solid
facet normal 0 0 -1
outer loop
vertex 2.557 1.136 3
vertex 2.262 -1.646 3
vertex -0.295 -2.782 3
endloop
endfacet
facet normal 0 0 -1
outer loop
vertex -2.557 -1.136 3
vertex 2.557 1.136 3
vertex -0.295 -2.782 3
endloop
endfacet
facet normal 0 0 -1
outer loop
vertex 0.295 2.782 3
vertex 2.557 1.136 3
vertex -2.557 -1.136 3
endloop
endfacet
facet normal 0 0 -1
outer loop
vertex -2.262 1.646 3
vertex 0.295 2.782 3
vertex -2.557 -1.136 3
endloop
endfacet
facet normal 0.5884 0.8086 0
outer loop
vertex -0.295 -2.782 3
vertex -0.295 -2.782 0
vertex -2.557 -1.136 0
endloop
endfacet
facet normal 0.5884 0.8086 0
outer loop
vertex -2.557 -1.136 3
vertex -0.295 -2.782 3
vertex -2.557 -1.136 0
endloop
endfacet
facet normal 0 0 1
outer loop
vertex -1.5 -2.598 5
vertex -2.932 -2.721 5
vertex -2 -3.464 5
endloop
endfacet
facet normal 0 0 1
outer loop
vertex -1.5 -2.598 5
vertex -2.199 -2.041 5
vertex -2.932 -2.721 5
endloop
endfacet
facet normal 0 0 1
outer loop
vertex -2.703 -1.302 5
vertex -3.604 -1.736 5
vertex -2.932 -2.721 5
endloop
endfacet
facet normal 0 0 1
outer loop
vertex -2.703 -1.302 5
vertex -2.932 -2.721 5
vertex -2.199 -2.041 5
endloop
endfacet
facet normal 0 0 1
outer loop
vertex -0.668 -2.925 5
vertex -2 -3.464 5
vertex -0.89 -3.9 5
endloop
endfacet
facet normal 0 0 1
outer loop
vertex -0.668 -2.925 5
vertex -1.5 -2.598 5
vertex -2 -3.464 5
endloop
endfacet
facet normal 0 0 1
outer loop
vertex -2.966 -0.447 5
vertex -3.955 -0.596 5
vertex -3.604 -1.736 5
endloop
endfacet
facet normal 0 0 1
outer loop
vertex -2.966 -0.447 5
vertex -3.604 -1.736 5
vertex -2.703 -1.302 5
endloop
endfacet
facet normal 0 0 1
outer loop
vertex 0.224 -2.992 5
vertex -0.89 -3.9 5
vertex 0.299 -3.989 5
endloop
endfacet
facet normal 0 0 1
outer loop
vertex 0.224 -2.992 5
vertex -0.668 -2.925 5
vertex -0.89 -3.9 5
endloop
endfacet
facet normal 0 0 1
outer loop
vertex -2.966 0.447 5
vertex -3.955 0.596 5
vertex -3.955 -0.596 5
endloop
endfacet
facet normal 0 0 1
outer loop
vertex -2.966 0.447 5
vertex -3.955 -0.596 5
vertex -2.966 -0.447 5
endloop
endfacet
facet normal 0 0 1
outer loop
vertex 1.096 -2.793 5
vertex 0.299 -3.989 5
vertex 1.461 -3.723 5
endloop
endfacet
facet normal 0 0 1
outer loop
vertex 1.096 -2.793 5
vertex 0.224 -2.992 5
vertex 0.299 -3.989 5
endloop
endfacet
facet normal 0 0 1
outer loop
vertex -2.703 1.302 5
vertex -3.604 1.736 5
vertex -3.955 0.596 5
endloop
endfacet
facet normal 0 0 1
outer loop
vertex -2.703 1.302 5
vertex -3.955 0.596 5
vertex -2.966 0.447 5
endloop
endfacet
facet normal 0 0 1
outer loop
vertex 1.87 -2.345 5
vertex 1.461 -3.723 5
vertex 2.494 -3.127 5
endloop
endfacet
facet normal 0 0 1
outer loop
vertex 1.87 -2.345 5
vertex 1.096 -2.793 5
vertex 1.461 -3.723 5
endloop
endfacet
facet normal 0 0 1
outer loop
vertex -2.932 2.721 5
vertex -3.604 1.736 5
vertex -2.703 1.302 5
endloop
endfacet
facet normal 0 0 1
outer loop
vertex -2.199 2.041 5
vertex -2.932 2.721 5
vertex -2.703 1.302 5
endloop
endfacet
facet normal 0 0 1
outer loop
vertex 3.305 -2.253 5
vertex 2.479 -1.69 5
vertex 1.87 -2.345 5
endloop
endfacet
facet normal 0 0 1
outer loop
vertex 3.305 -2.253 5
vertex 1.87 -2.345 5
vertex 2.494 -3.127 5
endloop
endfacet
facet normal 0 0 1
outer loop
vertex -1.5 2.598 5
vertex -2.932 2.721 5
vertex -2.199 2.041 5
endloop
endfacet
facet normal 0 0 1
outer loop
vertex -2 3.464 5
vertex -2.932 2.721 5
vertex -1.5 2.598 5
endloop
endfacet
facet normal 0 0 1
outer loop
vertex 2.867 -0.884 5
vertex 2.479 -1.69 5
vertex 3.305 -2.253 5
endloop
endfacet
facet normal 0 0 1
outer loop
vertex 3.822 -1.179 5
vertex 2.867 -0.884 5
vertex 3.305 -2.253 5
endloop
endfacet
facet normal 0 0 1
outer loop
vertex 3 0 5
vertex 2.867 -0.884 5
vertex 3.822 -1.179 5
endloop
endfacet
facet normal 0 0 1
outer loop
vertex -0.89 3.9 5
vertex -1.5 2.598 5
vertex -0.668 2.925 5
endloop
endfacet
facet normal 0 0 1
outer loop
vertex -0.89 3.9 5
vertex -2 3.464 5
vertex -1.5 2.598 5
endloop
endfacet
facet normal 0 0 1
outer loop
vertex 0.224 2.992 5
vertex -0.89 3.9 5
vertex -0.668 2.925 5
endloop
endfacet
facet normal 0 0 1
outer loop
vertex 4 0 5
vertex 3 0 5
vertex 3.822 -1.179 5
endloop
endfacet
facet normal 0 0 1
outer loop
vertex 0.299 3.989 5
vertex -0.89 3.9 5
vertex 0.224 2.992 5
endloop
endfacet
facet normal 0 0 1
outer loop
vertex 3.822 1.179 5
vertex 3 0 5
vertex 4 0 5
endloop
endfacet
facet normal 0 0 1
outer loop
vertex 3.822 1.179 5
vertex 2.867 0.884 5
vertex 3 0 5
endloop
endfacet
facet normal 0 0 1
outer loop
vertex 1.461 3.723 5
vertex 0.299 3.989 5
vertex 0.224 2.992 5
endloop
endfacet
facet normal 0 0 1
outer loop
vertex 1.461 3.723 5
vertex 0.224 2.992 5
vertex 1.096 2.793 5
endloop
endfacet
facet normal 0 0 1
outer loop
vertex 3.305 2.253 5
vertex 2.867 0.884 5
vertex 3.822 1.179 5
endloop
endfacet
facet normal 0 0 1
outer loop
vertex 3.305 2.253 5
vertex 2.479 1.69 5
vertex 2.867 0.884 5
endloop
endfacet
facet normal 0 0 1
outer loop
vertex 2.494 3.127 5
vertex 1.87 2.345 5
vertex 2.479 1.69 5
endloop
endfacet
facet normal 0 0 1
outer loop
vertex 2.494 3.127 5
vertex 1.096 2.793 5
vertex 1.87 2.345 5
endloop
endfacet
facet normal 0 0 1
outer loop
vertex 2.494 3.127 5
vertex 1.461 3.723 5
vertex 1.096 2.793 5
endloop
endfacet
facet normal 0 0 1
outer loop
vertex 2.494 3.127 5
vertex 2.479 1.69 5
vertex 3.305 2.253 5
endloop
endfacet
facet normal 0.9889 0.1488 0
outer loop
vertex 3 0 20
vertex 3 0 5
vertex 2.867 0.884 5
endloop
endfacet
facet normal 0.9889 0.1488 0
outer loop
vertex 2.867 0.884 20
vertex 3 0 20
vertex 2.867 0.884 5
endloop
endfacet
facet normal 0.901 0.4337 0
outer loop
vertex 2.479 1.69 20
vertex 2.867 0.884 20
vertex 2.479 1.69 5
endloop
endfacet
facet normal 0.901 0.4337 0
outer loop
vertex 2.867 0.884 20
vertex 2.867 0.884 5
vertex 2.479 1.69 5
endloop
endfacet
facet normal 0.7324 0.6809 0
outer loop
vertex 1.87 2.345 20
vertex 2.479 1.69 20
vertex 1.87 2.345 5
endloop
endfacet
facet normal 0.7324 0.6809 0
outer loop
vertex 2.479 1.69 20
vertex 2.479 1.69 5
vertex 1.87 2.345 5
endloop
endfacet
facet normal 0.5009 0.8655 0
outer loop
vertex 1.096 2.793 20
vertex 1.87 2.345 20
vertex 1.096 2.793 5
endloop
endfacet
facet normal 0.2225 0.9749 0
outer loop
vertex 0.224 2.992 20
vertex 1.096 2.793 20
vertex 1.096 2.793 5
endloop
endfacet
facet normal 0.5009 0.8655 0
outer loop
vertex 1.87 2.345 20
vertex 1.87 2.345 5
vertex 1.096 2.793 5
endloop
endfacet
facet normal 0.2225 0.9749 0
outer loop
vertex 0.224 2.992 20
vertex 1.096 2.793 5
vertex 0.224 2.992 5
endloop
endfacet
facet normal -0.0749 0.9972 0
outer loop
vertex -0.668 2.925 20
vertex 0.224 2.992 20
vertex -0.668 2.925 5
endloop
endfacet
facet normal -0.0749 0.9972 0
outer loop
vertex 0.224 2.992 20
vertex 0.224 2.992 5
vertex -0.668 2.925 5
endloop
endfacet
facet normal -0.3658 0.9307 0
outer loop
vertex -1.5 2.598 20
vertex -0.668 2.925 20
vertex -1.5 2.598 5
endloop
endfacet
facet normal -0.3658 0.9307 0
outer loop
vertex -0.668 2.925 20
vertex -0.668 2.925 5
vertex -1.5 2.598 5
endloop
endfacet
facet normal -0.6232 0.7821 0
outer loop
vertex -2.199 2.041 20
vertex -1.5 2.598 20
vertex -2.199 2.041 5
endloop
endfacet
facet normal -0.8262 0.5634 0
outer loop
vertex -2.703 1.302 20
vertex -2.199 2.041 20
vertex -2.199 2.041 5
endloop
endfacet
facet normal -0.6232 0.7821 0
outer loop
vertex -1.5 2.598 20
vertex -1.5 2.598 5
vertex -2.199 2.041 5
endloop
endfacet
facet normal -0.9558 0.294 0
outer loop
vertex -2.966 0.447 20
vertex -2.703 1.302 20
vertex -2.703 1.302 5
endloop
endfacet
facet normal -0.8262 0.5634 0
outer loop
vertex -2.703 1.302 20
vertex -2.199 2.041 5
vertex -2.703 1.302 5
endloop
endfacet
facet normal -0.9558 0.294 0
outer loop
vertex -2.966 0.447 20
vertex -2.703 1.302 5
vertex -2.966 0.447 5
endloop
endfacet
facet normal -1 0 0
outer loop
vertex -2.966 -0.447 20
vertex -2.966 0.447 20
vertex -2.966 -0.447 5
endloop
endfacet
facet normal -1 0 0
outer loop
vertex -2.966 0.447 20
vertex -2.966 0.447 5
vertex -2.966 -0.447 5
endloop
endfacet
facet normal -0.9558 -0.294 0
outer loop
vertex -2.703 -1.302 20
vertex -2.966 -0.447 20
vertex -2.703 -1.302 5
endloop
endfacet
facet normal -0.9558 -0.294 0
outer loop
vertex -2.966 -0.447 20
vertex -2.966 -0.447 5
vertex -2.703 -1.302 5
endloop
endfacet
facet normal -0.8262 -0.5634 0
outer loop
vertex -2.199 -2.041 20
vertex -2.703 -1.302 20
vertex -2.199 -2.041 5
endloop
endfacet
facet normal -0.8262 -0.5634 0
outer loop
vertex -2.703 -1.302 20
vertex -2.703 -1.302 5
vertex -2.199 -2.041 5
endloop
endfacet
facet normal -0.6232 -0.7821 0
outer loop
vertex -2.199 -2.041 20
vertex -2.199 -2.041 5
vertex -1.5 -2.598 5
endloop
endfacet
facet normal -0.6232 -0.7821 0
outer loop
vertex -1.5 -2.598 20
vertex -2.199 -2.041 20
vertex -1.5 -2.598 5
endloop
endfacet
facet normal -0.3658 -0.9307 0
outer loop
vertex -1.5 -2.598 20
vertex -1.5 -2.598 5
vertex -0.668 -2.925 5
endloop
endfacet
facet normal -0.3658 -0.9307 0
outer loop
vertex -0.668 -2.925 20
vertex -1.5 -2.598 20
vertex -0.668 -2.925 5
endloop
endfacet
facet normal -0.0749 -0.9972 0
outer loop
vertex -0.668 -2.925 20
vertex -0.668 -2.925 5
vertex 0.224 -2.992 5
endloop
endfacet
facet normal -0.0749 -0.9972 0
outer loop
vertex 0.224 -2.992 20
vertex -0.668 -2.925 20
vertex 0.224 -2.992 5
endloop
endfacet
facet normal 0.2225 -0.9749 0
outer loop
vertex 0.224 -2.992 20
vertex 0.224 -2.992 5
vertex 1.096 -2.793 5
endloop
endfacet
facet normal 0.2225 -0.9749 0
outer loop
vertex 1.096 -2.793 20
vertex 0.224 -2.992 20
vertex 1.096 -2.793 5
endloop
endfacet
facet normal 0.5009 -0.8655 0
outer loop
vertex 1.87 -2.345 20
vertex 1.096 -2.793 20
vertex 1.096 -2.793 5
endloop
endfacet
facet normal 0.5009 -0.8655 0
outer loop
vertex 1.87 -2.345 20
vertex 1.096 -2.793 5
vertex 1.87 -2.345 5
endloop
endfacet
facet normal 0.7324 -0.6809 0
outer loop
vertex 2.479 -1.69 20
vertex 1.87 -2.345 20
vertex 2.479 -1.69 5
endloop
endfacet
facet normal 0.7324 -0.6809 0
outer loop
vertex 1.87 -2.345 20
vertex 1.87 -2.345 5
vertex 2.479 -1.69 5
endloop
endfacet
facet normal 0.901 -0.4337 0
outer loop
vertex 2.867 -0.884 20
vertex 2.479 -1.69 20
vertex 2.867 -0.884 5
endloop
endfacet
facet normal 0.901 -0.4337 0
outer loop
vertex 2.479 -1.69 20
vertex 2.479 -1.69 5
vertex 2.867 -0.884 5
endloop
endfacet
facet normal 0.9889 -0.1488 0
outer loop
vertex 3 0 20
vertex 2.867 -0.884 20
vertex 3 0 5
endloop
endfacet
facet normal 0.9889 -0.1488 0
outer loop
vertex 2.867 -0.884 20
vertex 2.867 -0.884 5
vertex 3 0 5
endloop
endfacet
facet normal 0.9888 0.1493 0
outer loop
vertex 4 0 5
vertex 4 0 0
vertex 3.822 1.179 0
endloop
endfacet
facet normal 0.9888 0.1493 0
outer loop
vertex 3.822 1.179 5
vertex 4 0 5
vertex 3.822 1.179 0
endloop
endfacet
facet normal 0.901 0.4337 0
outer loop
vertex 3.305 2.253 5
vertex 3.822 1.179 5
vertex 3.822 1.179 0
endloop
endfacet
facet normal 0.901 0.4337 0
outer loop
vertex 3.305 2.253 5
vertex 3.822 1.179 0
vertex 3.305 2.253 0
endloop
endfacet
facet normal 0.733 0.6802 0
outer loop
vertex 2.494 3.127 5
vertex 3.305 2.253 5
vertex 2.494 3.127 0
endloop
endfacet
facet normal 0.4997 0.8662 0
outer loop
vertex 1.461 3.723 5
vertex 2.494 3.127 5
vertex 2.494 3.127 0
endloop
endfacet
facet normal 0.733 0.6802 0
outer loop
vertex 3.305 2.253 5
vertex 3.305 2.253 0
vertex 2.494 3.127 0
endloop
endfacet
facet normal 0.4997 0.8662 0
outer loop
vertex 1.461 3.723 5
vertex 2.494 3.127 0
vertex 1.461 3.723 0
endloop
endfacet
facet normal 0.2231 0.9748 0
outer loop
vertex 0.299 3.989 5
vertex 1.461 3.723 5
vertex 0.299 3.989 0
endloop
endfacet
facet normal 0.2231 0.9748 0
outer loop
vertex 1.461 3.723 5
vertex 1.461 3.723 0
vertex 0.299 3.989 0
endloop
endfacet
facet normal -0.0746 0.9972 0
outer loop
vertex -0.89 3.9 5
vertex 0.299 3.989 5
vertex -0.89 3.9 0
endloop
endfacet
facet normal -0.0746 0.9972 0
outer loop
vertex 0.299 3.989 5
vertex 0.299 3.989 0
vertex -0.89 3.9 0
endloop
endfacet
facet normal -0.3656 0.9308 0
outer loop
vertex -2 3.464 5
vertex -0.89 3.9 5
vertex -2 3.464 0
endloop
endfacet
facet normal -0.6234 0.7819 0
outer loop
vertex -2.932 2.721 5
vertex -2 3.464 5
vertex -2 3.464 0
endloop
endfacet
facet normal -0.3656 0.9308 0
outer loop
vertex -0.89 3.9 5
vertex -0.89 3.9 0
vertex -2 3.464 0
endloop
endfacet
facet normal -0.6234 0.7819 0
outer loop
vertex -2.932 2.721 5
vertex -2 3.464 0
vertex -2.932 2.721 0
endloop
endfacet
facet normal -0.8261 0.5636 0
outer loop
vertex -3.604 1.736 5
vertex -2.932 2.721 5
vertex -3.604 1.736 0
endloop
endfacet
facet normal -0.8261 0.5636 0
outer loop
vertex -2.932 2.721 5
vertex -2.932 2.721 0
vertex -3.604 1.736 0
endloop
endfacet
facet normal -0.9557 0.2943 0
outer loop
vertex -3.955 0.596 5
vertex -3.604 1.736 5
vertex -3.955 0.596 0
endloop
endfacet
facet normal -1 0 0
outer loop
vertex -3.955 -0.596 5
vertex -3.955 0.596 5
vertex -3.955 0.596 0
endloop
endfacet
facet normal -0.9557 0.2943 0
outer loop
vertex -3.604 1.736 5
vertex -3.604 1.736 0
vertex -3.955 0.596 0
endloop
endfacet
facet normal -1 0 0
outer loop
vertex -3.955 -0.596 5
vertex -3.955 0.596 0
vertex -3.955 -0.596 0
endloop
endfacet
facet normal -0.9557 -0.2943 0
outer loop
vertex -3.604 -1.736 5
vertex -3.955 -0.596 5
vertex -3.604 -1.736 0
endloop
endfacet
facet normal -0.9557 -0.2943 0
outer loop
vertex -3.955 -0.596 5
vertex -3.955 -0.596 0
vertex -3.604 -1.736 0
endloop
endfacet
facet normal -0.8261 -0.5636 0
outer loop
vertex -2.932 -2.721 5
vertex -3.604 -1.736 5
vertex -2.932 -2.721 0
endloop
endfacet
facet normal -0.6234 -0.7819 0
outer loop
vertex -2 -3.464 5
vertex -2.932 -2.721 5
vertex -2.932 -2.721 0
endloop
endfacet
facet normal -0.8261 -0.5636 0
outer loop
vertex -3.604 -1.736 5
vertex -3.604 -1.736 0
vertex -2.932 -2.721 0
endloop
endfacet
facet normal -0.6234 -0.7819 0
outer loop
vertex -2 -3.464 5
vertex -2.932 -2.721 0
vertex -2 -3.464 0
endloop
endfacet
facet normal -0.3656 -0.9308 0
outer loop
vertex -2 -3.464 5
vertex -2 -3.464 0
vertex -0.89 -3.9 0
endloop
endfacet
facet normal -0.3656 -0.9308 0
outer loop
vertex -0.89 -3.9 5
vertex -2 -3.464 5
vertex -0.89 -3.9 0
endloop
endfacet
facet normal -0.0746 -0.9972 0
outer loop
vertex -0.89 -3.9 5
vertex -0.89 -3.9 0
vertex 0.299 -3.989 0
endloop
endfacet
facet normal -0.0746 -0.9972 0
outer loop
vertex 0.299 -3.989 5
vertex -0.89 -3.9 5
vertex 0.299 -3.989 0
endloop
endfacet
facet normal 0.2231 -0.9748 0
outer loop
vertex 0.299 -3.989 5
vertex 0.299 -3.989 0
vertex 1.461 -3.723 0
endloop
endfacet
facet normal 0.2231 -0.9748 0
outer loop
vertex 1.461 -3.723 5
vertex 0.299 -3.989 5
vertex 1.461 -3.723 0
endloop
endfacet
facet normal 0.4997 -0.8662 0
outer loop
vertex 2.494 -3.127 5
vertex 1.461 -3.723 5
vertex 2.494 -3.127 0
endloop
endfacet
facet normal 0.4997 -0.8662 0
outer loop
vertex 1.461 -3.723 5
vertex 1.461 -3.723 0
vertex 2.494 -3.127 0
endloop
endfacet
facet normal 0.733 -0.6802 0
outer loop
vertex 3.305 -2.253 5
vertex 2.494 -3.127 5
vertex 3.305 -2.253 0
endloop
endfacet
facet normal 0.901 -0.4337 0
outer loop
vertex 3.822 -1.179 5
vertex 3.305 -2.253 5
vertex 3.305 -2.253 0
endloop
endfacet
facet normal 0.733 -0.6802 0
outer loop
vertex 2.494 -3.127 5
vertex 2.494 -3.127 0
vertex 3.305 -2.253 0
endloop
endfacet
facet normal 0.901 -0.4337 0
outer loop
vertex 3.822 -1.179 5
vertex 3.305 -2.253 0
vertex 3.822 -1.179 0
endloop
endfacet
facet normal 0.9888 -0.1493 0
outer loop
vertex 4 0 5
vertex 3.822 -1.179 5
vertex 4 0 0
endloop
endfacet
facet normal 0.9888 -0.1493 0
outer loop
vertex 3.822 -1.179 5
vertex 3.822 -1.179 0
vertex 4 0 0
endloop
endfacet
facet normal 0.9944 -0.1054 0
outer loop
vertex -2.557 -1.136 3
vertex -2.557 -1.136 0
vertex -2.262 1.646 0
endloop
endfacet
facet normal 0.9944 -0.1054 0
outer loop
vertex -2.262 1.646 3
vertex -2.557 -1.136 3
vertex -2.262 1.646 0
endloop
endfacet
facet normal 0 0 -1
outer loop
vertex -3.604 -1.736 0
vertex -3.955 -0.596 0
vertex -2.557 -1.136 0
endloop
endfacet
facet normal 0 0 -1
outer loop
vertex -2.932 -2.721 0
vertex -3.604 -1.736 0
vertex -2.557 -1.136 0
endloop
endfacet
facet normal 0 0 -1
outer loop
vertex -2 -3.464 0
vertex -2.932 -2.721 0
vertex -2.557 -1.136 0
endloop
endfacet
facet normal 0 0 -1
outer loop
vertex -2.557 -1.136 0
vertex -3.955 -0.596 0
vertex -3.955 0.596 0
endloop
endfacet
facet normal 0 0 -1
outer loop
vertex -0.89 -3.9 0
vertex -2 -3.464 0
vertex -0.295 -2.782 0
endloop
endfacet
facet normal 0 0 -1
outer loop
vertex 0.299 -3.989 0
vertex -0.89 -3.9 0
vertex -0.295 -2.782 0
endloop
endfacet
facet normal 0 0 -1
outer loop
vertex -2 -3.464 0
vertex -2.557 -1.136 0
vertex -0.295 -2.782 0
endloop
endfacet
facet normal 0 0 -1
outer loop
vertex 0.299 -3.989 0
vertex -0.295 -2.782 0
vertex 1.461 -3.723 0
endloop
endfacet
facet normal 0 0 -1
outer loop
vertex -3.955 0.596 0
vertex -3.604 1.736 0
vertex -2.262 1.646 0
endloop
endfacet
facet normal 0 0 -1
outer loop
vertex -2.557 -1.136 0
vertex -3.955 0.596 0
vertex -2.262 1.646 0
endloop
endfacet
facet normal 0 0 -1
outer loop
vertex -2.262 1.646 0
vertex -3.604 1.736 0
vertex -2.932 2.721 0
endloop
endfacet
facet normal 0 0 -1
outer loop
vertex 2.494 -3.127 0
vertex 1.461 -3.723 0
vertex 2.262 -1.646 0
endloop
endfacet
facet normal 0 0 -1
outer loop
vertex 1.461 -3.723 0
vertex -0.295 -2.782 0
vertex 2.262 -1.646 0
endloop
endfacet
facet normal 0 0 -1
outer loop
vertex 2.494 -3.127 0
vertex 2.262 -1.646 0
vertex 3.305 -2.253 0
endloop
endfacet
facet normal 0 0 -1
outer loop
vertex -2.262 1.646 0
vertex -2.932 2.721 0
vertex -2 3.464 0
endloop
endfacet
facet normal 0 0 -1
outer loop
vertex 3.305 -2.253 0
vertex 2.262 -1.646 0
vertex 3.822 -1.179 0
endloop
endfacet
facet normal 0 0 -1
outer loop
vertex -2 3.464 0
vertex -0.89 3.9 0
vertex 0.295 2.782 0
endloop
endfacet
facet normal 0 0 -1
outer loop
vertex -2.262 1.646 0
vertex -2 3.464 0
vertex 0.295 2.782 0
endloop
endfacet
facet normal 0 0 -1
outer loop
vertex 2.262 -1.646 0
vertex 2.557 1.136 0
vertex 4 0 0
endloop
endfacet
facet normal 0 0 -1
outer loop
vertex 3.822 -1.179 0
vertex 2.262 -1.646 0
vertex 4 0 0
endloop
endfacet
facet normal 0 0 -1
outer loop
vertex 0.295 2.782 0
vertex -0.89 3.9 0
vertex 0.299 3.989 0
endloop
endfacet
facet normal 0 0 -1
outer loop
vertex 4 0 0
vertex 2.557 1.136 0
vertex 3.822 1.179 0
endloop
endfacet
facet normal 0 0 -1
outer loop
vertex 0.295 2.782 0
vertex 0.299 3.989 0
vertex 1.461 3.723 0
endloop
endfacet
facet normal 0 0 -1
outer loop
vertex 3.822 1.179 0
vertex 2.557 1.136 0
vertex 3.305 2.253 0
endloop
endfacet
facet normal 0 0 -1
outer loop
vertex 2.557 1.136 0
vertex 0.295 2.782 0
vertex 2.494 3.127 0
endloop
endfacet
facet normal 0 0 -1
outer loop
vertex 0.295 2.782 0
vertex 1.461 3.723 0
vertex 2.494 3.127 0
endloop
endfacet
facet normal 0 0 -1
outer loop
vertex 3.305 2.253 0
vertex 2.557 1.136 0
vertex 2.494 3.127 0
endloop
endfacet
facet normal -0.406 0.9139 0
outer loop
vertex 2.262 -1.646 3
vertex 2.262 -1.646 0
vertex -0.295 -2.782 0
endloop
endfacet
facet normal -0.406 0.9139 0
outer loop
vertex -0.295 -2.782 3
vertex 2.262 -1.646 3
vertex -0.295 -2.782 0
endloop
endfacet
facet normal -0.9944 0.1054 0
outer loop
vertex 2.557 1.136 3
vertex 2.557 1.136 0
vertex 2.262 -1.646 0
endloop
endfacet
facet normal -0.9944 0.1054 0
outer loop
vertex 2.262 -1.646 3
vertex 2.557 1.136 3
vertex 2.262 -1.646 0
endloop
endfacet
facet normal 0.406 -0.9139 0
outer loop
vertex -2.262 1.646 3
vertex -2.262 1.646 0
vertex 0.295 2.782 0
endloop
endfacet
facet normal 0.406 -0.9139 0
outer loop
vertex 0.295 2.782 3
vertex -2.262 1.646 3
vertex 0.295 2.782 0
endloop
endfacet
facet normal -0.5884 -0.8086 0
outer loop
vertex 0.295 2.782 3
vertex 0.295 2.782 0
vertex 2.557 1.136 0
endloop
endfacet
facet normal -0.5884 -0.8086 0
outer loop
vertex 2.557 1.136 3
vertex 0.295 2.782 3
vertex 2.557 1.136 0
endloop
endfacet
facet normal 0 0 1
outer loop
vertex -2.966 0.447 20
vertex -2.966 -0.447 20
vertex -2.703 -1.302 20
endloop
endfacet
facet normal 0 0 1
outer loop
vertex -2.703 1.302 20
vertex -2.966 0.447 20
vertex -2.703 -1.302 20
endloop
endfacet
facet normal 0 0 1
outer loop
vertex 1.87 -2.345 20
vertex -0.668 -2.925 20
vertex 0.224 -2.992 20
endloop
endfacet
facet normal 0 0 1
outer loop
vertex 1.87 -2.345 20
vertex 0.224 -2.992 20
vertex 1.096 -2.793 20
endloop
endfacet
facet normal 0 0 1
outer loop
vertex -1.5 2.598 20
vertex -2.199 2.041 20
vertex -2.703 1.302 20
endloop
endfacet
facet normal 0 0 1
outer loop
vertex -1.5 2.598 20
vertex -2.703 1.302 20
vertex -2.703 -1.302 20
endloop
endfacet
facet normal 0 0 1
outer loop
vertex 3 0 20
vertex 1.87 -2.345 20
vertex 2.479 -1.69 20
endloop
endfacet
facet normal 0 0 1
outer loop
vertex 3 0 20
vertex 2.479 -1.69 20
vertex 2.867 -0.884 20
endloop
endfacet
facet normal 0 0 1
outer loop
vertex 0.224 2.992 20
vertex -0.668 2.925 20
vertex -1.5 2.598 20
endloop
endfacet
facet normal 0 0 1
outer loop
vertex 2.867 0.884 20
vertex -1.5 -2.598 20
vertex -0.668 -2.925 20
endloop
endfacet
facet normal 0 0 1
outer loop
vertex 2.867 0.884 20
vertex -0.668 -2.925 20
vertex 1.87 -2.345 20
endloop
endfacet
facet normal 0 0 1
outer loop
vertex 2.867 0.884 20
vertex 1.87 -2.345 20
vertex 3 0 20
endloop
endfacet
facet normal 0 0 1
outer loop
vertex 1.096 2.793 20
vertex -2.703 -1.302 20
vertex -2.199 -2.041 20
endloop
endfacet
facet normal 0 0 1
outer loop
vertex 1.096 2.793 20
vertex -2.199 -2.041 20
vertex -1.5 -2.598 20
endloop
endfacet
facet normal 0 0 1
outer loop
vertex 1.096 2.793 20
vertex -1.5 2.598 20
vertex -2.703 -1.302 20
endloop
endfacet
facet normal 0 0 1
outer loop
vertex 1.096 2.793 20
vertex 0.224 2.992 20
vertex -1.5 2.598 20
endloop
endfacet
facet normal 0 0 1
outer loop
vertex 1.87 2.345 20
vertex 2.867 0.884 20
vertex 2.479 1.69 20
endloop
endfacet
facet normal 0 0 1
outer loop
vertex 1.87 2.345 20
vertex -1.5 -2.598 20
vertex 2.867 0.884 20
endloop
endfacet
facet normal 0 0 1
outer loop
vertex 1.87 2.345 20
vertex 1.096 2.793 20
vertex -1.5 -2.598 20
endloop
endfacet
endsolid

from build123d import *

# Parameters (mm, degrees)
SKETCH1_R           = 4
BOSS_EXTRUDE1_DEPTH = 5
SKETCH2_R           = 3
BOSS_EXTRUDE2_DEPTH = 15
CUT_EXTRUDE1_DEPTH  = 3


with BuildPart() as part:
    # Sketch1 → Boss-Extrude1 (new body)
    with BuildSketch(Plane.XY):
        Circle(SKETCH1_R)
    extrude(amount=BOSS_EXTRUDE1_DEPTH)

    # Sketch2 → Boss-Extrude2 (add)
    with BuildSketch(Plane.XY.offset(5)):
        Circle(SKETCH2_R)
    extrude(amount=BOSS_EXTRUDE2_DEPTH)

    # Sketch3 → Cut-Extrude1 (cut)
    with BuildSketch(Plane(origin=(0, 0, 0), x_dir=(-1, 0, 0), z_dir=(0, 0, -1))):
        Polygon((0.294791558, -2.782244545), (2.556890234, -1.135825295), (2.262098677, 1.64641925), (-0.294791558, 2.782244545), (-2.556890234, 1.135825295), (-2.262098677, -1.64641925), align=None)
    extrude(amount=-CUT_EXTRUDE1_DEPTH, mode=Mode.SUBTRACT)


solid = part.part
